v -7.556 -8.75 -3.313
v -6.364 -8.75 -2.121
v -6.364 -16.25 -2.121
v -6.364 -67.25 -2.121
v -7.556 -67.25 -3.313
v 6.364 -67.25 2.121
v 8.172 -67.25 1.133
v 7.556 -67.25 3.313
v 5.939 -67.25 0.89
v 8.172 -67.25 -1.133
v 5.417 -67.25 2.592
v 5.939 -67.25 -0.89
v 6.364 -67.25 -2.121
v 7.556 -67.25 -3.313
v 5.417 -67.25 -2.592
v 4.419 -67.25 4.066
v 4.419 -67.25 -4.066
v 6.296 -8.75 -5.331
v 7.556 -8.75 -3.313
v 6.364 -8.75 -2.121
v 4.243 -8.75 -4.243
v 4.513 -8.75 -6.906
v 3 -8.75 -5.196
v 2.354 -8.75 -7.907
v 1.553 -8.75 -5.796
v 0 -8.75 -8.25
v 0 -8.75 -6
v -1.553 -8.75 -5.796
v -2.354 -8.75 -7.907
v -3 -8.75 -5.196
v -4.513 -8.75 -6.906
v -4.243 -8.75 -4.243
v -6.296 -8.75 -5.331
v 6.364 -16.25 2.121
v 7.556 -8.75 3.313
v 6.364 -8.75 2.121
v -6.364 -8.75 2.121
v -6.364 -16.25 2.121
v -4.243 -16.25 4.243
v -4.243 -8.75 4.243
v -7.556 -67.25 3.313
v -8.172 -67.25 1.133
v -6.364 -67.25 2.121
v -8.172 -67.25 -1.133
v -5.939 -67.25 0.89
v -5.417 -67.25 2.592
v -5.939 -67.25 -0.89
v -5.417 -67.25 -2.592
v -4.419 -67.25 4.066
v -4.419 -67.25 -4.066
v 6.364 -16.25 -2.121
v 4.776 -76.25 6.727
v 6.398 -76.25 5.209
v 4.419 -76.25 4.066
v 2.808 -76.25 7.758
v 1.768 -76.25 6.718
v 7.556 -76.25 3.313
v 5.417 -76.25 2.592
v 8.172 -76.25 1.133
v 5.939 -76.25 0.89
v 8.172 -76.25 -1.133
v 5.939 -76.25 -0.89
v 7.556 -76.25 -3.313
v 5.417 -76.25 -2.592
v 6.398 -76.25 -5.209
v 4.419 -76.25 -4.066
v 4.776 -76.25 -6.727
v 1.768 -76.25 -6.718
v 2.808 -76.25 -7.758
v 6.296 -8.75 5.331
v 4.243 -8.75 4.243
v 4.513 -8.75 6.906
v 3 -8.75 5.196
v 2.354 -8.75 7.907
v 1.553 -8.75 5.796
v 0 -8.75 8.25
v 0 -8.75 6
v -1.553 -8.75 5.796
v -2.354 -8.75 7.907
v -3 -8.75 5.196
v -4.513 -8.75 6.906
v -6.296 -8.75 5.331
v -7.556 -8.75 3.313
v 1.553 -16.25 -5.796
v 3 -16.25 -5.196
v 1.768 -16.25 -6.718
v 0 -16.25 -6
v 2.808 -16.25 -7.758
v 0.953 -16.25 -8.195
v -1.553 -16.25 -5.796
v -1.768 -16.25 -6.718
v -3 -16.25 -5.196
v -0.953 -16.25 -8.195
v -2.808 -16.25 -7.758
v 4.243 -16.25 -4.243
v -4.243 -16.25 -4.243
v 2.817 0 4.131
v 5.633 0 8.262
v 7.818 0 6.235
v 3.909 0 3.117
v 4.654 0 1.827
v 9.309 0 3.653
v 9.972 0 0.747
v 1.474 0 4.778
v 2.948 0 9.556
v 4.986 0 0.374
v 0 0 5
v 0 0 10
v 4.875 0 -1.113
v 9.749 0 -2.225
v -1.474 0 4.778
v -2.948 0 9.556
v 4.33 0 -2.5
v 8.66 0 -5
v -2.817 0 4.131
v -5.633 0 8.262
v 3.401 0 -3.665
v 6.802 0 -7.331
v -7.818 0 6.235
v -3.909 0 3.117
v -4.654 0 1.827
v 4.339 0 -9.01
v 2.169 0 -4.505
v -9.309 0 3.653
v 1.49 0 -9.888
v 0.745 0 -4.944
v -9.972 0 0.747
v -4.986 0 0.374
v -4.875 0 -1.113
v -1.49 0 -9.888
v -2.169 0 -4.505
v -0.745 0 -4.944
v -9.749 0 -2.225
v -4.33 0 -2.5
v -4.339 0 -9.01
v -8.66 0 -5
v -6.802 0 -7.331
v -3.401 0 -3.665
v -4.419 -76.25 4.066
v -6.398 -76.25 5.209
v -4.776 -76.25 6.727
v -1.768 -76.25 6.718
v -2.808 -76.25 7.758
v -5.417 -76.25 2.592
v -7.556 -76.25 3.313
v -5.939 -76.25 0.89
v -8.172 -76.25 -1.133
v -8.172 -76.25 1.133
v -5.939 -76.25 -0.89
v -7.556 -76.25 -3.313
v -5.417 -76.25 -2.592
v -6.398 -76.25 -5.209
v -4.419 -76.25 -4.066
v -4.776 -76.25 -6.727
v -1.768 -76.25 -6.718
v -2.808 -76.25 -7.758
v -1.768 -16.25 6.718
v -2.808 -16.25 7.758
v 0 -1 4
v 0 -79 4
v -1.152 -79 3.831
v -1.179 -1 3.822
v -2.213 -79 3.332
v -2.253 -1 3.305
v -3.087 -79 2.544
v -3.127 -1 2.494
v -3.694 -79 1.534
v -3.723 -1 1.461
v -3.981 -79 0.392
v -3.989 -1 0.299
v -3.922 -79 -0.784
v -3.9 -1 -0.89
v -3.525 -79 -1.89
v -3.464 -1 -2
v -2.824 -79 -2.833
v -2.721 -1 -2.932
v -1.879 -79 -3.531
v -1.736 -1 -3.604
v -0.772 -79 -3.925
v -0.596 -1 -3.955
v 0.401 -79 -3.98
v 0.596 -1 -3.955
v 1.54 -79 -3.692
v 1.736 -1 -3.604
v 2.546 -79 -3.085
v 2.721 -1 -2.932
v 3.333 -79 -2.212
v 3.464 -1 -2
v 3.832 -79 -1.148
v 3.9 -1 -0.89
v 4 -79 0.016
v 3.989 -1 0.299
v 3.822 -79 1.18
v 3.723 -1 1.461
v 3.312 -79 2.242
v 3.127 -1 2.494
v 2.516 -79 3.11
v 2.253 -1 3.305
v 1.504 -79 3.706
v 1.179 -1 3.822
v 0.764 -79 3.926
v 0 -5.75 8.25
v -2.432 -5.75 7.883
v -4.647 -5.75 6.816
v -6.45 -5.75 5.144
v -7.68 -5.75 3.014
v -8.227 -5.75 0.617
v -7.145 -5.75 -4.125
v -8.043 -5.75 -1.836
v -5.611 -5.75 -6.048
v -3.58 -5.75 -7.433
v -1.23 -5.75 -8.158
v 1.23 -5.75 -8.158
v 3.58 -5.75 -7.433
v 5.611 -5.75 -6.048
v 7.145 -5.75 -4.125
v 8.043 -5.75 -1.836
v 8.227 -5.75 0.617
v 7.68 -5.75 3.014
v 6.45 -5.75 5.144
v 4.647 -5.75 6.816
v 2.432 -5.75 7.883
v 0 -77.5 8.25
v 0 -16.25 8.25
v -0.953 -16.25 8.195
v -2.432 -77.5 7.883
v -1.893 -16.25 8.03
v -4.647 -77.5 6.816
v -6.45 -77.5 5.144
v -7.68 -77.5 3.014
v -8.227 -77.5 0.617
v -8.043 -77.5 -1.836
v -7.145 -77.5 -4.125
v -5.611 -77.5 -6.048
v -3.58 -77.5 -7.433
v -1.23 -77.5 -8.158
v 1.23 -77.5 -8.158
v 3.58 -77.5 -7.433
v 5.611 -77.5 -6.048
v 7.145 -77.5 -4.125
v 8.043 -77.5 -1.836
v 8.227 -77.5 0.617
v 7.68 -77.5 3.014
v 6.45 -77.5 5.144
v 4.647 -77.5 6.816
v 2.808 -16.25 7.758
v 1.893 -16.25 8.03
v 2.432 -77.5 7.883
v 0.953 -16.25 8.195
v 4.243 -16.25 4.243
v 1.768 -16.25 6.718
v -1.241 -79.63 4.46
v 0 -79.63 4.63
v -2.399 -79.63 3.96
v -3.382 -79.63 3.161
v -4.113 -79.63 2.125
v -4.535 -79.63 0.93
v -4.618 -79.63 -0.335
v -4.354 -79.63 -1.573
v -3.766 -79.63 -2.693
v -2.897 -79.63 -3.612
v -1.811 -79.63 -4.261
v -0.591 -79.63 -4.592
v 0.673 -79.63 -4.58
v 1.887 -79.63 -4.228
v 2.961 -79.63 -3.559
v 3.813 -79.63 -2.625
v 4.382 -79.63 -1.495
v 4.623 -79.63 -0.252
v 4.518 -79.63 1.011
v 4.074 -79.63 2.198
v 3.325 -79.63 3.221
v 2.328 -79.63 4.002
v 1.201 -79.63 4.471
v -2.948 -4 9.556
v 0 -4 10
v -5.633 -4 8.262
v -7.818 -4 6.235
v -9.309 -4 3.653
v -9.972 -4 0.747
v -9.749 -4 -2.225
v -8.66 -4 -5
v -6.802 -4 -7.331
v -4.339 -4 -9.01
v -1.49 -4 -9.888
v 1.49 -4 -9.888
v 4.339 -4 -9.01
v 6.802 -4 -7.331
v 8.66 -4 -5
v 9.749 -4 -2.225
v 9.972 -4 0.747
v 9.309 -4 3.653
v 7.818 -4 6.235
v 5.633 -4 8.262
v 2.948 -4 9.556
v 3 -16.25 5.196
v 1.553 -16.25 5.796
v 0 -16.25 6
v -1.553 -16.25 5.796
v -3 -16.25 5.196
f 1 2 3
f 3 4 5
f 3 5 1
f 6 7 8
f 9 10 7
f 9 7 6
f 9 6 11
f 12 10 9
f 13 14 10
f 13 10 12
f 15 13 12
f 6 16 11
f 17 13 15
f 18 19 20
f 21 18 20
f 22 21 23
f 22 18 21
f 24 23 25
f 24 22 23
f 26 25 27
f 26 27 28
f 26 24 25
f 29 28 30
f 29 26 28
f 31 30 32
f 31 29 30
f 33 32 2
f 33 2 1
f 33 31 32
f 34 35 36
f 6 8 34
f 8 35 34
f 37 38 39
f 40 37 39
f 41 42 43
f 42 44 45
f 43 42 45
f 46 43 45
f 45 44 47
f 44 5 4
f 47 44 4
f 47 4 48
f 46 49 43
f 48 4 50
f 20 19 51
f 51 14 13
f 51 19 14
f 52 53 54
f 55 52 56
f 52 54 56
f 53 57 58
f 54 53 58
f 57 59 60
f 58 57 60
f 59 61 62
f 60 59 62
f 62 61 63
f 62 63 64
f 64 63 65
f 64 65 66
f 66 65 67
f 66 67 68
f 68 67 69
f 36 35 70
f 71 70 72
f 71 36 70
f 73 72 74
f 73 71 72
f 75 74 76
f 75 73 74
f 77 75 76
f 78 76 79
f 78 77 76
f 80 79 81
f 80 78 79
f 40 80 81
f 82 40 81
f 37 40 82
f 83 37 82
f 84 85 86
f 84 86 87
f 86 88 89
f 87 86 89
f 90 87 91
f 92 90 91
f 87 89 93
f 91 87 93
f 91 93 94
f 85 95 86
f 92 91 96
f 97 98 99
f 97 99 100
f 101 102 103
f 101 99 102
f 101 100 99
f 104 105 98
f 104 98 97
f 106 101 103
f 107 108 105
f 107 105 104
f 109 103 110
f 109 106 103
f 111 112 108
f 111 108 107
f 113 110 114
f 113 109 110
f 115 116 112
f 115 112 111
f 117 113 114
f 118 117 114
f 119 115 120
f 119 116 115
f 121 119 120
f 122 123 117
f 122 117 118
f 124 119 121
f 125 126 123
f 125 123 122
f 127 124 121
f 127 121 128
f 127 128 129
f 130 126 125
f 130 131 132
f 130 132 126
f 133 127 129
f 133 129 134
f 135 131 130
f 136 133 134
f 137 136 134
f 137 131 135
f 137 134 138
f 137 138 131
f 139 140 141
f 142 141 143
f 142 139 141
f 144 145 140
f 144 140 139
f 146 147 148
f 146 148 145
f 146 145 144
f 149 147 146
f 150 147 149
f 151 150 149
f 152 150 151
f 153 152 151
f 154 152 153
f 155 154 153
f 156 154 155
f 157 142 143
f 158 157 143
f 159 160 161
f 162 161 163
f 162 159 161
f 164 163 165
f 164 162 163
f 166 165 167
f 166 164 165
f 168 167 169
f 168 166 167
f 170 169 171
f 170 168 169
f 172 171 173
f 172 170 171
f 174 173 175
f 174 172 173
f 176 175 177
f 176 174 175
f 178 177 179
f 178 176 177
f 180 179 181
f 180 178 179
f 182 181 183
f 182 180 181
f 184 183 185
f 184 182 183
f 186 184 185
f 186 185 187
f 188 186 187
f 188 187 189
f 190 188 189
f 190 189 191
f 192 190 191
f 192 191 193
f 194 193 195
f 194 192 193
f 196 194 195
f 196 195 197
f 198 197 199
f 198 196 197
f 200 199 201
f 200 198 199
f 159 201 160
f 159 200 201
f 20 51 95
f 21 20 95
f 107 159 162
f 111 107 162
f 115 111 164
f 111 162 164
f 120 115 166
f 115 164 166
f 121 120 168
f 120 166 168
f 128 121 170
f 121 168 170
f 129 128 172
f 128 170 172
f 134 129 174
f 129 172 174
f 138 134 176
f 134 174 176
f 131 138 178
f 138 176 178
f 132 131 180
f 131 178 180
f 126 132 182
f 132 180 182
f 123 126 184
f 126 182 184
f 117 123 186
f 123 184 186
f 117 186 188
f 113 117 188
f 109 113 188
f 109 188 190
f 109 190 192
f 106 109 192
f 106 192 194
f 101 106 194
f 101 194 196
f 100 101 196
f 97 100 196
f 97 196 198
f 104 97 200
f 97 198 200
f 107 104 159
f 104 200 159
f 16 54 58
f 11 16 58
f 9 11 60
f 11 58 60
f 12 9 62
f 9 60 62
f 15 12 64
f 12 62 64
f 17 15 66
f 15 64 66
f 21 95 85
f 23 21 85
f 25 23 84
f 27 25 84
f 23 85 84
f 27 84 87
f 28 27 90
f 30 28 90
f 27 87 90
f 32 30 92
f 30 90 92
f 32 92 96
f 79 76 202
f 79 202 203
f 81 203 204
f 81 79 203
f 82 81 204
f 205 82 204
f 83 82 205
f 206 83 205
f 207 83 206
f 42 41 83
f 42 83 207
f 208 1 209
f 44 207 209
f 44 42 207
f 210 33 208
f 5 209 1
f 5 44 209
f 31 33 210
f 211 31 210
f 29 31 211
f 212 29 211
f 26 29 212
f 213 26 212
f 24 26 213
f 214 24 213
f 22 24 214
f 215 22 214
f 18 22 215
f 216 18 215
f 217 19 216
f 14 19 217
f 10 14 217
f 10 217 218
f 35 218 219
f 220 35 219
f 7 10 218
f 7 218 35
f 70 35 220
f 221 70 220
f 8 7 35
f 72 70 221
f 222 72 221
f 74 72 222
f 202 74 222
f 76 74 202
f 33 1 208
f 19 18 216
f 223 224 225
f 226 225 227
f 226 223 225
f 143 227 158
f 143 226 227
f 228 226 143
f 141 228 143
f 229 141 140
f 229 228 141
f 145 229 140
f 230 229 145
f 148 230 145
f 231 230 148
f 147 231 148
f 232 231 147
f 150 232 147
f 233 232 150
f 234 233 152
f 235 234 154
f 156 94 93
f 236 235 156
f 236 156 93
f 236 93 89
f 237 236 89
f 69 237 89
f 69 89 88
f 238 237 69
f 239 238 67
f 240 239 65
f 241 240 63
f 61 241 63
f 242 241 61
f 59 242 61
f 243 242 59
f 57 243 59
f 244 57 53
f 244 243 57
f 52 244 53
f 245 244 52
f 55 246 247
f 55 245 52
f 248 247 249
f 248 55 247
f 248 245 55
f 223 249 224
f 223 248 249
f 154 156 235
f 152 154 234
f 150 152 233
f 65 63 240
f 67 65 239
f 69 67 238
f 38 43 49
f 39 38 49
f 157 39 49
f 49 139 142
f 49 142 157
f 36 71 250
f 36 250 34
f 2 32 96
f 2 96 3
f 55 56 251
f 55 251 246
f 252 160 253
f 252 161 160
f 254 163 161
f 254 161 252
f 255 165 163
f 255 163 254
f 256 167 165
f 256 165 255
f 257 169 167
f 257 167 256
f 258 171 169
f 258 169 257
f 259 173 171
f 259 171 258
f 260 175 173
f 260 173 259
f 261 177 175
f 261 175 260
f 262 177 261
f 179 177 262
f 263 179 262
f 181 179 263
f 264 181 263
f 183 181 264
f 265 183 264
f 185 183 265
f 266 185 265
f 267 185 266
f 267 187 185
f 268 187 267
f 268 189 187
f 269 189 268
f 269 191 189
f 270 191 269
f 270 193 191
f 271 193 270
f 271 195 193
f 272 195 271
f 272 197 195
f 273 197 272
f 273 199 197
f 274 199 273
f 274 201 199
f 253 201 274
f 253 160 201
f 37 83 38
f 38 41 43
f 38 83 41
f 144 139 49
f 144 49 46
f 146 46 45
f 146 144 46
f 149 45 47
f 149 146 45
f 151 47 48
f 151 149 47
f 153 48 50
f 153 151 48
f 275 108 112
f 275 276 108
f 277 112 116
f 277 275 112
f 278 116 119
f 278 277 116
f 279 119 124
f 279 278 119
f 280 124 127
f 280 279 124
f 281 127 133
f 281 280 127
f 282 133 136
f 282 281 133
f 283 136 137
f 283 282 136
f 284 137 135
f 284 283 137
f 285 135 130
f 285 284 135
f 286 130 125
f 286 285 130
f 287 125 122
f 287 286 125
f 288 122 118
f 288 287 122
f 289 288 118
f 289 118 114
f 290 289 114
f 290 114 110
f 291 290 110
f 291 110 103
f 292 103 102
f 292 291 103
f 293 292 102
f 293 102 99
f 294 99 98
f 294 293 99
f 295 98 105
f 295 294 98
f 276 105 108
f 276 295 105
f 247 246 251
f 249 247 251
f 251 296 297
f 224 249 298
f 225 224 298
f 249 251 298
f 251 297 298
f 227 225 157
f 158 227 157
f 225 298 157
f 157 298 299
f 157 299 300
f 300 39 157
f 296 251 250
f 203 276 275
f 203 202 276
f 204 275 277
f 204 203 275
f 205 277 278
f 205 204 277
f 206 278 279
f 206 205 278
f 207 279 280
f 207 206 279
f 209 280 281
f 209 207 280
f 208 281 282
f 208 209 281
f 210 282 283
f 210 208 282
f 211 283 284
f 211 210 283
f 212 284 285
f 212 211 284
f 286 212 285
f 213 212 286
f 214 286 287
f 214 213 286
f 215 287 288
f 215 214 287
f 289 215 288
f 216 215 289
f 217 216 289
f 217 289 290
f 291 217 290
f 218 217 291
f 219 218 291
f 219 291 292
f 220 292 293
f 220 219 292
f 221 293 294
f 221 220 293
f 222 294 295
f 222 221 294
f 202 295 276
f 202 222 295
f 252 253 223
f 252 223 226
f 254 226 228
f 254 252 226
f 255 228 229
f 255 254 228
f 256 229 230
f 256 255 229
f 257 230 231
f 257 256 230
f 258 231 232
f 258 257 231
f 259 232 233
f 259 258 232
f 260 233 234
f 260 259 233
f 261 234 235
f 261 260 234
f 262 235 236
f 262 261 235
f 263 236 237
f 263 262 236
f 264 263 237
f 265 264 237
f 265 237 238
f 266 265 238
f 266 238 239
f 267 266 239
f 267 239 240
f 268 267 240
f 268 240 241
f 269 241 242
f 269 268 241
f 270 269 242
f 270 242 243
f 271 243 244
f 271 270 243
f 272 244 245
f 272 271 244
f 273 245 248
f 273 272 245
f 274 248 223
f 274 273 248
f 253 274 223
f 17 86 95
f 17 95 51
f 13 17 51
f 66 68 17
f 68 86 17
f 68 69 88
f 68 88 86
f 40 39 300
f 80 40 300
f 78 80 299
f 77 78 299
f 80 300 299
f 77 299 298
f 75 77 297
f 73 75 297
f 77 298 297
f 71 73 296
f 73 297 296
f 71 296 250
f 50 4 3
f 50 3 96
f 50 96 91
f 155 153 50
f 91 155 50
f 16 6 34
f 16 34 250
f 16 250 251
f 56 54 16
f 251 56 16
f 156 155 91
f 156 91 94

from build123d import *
from OCP.BRepFilletAPI import BRepFilletAPI_MakeChamfer

# Parameters (mm, degrees)
CUT_EXTRUDE1_START = -7.5
CUT_EXTRUDE1_DEPTH = 7.5
CUT_EXTRUDE3_START = -60
CUT_EXTRUDE3_DEPTH = 60
CUT_EXTRUDE4_DEPTH = 9
CHAMFER1_SIZE      = 1
CHAMFER1_SIZE2     = 0.730484553


with BuildPart() as part:
    # Sketch1 → Revolve1 (revolve)
    with BuildSketch(Plane.XY, mode=Mode.PRIVATE) as revolve1_sk:
        Polygon((4, 0), (10, 0), (10, -4), (8.25, -5.75), (8.25, -77.5), (4, -80), align=None)
    revolve(revolve1_sk.sketch.rotate(Axis((0, 0, 0), (0, -1, 0)), 90), axis=Axis((0, 0, 0), (0, -1, 0)))

    # Sketch3 → Cut-Extrude1 (cut)
    with BuildSketch(Plane(origin=(0, -8.75, 0), x_dir=(1, 0, 0), z_dir=(0, 1, 0)).offset(CUT_EXTRUDE1_START)):
        with BuildLine():
            ThreePointArc((4.242640687, 4.242640687), (0, 6), (-4.242640687, 4.242640687))
            Line((-4.242640687, 4.242640687), (-6.363961031, 2.121320344))
            Line((-6.363961031, 2.121320344), (-7.555586623, 3.312945936))
            ThreePointArc((-7.555586623, 3.312945936), (0, 8.25), (7.555586623, 3.312945936))
            Line((7.555586623, 3.312945936), (6.363961031, 2.121320344))
            Line((6.363961031, 2.121320344), (4.242640687, 4.242640687))
        make_face()
        with BuildLine():
            ThreePointArc((7.555586623, -3.312945936), (0, -8.25), (-7.555586623, -3.312945936))
            Line((-7.555586623, -3.312945936), (-6.363961031, -2.121320344))
            Line((-6.363961031, -2.121320344), (-4.242640687, -4.242640687))
            ThreePointArc((-4.242640687, -4.242640687), (0, -6), (4.242640687, -4.242640687))
            Line((4.242640687, -4.242640687), (6.363961031, -2.121320344))
            Line((6.363961031, -2.121320344), (7.555586623, -3.312945936))
        make_face()
    extrude(amount=CUT_EXTRUDE1_DEPTH, mode=Mode.SUBTRACT)

    # Sketch4 → Cut-Extrude3 (cut)
    with BuildSketch(Plane(origin=(0, -16.25, 0), x_dir=(1, 0, 0), z_dir=(0, 1, 0)).offset(CUT_EXTRUDE3_START)):
        with BuildLine():
            Line((2.807762918, 7.757510386), (1.767766953, 6.717514421))
            Line((1.767766953, 6.717514421), (6.363961031, 2.121320344))
            Line((6.363961031, 2.121320344), (7.555586623, 3.312945936))
            ThreePointArc((7.555586623, 3.312945936), (5.638110651, 6.022807342), (2.807762918, 7.757510386))
        make_face()
        with BuildLine():
            Line((-7.555586623, 3.312945936), (-6.363961031, 2.121320344))
            Line((-6.363961031, 2.121320344), (-1.767766953, 6.717514421))
            Line((-1.767766953, 6.717514421), (-2.807762918, 7.757510386))
            ThreePointArc((-2.807762918, 7.757510386), (-5.638110651, 6.022807342), (-7.555586623, 3.312945936))
        make_face()
        with BuildLine():
            Line((-1.767766953, -6.717514421), (-2.807762918, -7.757510386))
            ThreePointArc((-2.807762918, -7.757510386), (-5.638110651, -6.022807342), (-7.555586623, -3.312945936))
            Line((-7.555586623, -3.312945936), (-6.363961031, -2.121320344))
            Line((-6.363961031, -2.121320344), (-1.767766953, -6.717514421))
        make_face()
        with BuildLine():
            Line((7.555586623, -3.312945936), (6.363961031, -2.121320344))
            Line((6.363961031, -2.121320344), (1.767766953, -6.717514421))
            Line((1.767766953, -6.717514421), (2.807762918, -7.757510386))
            ThreePointArc((2.807762918, -7.757510386), (5.638110651, -6.022807342), (7.555586623, -3.312945936))
        make_face()
    extrude(amount=CUT_EXTRUDE3_DEPTH, mode=Mode.SUBTRACT)

    # Sketch6 → Cut-Extrude4 (cut)
    with BuildSketch(Plane(origin=(0, -76.25, 0), x_dir=(1, 0, 0), z_dir=(0, 1, 0))):
        with BuildLine():
            Line((2.807762918, -7.757510386), (1.767766953, -6.717514421))
            Line((1.767766953, -6.717514421), (4.065863992, -4.419417382))
            ThreePointArc((4.065863992, -4.419417382), (6.005206075, 0), (4.065863992, 4.419417382))
            Line((4.065863992, 4.419417382), (1.767766953, 6.717514421))
            Line((1.767766953, 6.717514421), (2.807762918, 7.757510386))
            ThreePointArc((2.807762918, 7.757510386), (8.25, 0), (2.807762918, -7.757510386))
        make_face()
        with BuildLine():
            Line((-1.767766953, 6.717514421), (-2.807762918, 7.757510386))
            ThreePointArc((-2.807762918, 7.757510386), (-8.25, 0), (-2.807762918, -7.757510386))
            Line((-2.807762918, -7.757510386), (-1.767766953, -6.717514421))
            Line((-1.767766953, -6.717514421), (-4.065863992, -4.419417382))
            ThreePointArc((-4.065863992, -4.419417382), (-6.005206075, 0), (-4.065863992, 4.419417382))
            Line((-4.065863992, 4.419417382), (-1.767766953, 6.717514421))
        make_face()
    extrude(amount=CUT_EXTRUDE4_DEPTH, mode=Mode.SUBTRACT)

    # Chamfer1: one chamfer whose edges measure the first distance from different faces: ONE call of the kernel's chamfer builder (chamfer() names one face for all edges)
    chamfer1_edges_1 = [part.edges().sort_by_distance(p)[0] for p in [
        (0, 0, -4),
    ]]
    chamfer1_edges_2 = [part.edges().sort_by_distance(p)[0] for p in [
        (0, -80, -4),
    ]]
    chamfer1_side_2 = [part.faces().sort_by_distance(p)[0] for p in [
        (0, -40, -4),
    ]]
    chamfer1 = BRepFilletAPI_MakeChamfer(part.part.solid().wrapped)
    for e in chamfer1_edges_1:
        chamfer1.Add(CHAMFER1_SIZE, e.wrapped)
    for e in chamfer1_edges_2:
        chamfer1.Add(CHAMFER1_SIZE, CHAMFER1_SIZE2, e.wrapped, chamfer1_side_2[0].wrapped)  # the first distance lies on this face
    add(Compound.cast(chamfer1.Shape()), mode=Mode.REPLACE)


solid = part.part
